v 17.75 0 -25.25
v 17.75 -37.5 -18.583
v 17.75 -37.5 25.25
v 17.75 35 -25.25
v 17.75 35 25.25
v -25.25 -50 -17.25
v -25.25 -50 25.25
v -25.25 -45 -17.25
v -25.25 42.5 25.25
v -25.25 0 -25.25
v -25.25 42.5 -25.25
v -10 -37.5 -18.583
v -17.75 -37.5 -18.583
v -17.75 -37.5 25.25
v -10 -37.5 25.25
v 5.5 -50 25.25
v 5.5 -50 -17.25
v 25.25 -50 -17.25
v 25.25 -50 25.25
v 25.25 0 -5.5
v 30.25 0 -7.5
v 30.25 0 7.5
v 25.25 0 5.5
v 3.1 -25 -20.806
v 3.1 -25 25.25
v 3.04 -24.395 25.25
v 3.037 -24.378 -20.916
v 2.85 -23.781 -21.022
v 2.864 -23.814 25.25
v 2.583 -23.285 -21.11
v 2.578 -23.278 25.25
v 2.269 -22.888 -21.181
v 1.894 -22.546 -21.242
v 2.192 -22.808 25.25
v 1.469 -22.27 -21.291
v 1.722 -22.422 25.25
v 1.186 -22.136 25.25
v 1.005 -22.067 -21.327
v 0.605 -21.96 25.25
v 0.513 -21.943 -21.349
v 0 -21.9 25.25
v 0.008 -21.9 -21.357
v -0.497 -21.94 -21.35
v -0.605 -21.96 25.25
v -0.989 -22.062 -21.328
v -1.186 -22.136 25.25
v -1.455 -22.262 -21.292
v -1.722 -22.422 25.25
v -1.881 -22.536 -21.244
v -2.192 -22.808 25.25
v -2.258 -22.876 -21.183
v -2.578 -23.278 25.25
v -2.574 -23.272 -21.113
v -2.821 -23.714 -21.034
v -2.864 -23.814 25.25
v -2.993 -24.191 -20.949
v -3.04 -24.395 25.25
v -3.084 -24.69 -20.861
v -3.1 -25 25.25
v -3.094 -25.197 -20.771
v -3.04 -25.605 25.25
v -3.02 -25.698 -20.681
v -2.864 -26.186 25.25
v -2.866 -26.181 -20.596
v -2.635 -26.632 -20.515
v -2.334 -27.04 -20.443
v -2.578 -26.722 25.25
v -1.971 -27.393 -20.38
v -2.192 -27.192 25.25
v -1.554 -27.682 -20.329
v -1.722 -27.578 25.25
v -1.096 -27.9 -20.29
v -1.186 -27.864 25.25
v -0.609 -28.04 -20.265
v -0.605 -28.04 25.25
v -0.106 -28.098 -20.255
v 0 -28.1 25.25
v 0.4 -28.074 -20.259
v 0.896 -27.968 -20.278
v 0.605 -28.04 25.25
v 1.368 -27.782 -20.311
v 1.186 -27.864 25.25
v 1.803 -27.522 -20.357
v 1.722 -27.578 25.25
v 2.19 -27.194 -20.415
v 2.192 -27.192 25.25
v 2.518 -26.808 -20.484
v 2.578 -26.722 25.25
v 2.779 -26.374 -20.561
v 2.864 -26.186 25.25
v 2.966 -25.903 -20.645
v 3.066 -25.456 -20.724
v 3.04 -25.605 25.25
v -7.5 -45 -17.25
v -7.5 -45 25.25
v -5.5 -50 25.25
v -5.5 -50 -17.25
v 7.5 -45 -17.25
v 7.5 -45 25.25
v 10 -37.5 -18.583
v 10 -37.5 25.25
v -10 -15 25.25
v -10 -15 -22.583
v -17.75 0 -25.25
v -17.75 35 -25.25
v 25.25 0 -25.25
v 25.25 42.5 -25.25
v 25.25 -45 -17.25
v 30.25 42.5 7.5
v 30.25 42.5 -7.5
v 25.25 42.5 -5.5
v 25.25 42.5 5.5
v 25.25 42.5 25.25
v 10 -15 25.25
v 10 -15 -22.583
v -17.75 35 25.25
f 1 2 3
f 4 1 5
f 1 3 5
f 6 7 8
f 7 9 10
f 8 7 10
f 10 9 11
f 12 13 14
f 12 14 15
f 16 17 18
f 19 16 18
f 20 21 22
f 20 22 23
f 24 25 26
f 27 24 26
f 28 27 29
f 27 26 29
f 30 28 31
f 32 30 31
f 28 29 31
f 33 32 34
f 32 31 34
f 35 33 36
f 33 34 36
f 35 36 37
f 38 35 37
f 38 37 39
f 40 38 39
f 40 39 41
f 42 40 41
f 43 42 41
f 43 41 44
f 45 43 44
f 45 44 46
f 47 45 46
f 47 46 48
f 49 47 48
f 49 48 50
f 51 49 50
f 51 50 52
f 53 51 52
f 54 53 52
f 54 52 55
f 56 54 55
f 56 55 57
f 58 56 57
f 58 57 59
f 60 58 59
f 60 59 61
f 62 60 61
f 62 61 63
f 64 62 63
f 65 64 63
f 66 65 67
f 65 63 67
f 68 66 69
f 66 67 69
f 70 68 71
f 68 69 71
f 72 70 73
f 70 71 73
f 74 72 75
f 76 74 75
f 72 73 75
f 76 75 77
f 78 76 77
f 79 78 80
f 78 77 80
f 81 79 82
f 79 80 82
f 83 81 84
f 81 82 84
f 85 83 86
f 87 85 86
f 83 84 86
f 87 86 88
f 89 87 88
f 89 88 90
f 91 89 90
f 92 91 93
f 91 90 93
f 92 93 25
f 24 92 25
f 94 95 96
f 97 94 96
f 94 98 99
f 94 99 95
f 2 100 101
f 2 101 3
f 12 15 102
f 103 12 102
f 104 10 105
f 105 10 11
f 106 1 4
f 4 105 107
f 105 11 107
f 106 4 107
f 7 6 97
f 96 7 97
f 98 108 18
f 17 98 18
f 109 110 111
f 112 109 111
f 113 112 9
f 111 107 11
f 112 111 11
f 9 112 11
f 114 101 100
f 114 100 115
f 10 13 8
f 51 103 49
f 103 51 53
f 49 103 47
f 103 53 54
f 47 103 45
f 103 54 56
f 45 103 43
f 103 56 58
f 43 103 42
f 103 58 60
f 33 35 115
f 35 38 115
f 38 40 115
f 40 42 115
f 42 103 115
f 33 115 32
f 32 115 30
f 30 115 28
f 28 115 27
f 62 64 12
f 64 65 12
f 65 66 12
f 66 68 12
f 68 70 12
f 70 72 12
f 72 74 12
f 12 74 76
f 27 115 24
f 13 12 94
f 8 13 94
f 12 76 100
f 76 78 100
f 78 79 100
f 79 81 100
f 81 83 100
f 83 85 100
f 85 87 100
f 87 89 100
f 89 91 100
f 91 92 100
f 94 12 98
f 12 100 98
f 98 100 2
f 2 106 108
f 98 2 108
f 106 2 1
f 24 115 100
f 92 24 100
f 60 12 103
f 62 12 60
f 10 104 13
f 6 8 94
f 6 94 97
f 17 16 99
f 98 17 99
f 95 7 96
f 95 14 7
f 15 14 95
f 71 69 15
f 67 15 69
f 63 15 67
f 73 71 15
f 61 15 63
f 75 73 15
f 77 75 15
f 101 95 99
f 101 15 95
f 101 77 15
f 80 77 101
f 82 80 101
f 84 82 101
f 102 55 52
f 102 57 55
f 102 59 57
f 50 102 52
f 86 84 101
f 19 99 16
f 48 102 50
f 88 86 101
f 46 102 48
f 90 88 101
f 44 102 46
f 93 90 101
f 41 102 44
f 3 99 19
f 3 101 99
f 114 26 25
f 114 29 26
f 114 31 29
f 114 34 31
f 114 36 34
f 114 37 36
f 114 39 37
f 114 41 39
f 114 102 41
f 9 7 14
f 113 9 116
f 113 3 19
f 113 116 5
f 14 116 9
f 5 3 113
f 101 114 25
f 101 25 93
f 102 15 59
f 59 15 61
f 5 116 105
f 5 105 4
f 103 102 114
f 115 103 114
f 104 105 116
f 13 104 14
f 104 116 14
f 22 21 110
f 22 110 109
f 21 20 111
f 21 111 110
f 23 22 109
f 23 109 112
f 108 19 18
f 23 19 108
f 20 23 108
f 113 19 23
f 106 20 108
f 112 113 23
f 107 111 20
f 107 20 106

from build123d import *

# Parameters (mm, degrees)
BOSS_EXTRUDE1_DEPTH = 42.5
BOSS_EXTRUDE2_DEPTH = 50
CUT_EXTRUDE1_DEPTH  = 70
CUT_EXTRUDE2_DEPTH  = 70
SKETCH4_R           = 3.1
CUT_EXTRUDE3_DEPTH  = 70
CUT_EXTRUDE4_DEPTH  = 55


with BuildPart() as part:
    # Sketch1 → Boss-Extrude1 (new body)
    with BuildSketch(Plane(origin=(0, 0, 0), x_dir=(1, 0, 0), z_dir=(0, 1, 0))):
        Polygon((25.25, -25.25), (25.25, -5.5), (30.25, -7.5), (30.25, 7.5), (25.25, 5.5), (25.25, 25.25), (-25.25, 25.25), (-25.25, -25.25), align=None)
    extrude(amount=BOSS_EXTRUDE1_DEPTH)

    # Sketch1<3> → Boss-Extrude2 (add)
    with BuildSketch(Plane(origin=(0, 0, 0), x_dir=(1, 0, 0), z_dir=(0, 1, 0))):
        Polygon((25.25, -5.5), (25.25, 5.5), (25.25, 25.25), (-25.25, 25.25), (-25.25, -25.25), (25.25, -25.25), align=None)
    extrude(amount=-BOSS_EXTRUDE2_DEPTH)

    # Sketch2 → Cut-Extrude1 (cut)
    with BuildSketch(Plane(origin=(0, 0, -25.25), x_dir=(-1, 0, 0), z_dir=(0, 0, -1))):
        Polygon((-5.5, -50), (-7.5, -45), (7.5, -45), (5.5, -50), align=None)
    extrude(amount=-CUT_EXTRUDE1_DEPTH, mode=Mode.SUBTRACT)

    # Sketch3 → Cut-Extrude2 (cut)
    with BuildSketch(Plane(origin=(25.25, 0, 0), x_dir=(0, 0, -1), z_dir=(1, 0, 0))):
        Polygon((17.25, -50), (25.25, -50), (25.25, 0), (17.25, -45), align=None)
    extrude(amount=-CUT_EXTRUDE2_DEPTH, mode=Mode.SUBTRACT)

    # Sketch4 → Cut-Extrude3 (cut)
    with BuildSketch(Plane.XY.offset(25.25)):
        with Locations((0, -25)):
            Circle(SKETCH4_R)
    extrude(amount=-CUT_EXTRUDE3_DEPTH, mode=Mode.SUBTRACT)

    # Sketch5 → Cut-Extrude4 (cut)
    with BuildSketch(Plane.XY.offset(25.25)):
        Polygon((17.75, 35), (-17.75, 35), (-17.75, -37.5), (-10, -37.5), (-10, -15), (10, -15), (10, -37.5), (17.75, -37.5), align=None)
    extrude(amount=-CUT_EXTRUDE4_DEPTH, mode=Mode.SUBTRACT)


solid = part.part
